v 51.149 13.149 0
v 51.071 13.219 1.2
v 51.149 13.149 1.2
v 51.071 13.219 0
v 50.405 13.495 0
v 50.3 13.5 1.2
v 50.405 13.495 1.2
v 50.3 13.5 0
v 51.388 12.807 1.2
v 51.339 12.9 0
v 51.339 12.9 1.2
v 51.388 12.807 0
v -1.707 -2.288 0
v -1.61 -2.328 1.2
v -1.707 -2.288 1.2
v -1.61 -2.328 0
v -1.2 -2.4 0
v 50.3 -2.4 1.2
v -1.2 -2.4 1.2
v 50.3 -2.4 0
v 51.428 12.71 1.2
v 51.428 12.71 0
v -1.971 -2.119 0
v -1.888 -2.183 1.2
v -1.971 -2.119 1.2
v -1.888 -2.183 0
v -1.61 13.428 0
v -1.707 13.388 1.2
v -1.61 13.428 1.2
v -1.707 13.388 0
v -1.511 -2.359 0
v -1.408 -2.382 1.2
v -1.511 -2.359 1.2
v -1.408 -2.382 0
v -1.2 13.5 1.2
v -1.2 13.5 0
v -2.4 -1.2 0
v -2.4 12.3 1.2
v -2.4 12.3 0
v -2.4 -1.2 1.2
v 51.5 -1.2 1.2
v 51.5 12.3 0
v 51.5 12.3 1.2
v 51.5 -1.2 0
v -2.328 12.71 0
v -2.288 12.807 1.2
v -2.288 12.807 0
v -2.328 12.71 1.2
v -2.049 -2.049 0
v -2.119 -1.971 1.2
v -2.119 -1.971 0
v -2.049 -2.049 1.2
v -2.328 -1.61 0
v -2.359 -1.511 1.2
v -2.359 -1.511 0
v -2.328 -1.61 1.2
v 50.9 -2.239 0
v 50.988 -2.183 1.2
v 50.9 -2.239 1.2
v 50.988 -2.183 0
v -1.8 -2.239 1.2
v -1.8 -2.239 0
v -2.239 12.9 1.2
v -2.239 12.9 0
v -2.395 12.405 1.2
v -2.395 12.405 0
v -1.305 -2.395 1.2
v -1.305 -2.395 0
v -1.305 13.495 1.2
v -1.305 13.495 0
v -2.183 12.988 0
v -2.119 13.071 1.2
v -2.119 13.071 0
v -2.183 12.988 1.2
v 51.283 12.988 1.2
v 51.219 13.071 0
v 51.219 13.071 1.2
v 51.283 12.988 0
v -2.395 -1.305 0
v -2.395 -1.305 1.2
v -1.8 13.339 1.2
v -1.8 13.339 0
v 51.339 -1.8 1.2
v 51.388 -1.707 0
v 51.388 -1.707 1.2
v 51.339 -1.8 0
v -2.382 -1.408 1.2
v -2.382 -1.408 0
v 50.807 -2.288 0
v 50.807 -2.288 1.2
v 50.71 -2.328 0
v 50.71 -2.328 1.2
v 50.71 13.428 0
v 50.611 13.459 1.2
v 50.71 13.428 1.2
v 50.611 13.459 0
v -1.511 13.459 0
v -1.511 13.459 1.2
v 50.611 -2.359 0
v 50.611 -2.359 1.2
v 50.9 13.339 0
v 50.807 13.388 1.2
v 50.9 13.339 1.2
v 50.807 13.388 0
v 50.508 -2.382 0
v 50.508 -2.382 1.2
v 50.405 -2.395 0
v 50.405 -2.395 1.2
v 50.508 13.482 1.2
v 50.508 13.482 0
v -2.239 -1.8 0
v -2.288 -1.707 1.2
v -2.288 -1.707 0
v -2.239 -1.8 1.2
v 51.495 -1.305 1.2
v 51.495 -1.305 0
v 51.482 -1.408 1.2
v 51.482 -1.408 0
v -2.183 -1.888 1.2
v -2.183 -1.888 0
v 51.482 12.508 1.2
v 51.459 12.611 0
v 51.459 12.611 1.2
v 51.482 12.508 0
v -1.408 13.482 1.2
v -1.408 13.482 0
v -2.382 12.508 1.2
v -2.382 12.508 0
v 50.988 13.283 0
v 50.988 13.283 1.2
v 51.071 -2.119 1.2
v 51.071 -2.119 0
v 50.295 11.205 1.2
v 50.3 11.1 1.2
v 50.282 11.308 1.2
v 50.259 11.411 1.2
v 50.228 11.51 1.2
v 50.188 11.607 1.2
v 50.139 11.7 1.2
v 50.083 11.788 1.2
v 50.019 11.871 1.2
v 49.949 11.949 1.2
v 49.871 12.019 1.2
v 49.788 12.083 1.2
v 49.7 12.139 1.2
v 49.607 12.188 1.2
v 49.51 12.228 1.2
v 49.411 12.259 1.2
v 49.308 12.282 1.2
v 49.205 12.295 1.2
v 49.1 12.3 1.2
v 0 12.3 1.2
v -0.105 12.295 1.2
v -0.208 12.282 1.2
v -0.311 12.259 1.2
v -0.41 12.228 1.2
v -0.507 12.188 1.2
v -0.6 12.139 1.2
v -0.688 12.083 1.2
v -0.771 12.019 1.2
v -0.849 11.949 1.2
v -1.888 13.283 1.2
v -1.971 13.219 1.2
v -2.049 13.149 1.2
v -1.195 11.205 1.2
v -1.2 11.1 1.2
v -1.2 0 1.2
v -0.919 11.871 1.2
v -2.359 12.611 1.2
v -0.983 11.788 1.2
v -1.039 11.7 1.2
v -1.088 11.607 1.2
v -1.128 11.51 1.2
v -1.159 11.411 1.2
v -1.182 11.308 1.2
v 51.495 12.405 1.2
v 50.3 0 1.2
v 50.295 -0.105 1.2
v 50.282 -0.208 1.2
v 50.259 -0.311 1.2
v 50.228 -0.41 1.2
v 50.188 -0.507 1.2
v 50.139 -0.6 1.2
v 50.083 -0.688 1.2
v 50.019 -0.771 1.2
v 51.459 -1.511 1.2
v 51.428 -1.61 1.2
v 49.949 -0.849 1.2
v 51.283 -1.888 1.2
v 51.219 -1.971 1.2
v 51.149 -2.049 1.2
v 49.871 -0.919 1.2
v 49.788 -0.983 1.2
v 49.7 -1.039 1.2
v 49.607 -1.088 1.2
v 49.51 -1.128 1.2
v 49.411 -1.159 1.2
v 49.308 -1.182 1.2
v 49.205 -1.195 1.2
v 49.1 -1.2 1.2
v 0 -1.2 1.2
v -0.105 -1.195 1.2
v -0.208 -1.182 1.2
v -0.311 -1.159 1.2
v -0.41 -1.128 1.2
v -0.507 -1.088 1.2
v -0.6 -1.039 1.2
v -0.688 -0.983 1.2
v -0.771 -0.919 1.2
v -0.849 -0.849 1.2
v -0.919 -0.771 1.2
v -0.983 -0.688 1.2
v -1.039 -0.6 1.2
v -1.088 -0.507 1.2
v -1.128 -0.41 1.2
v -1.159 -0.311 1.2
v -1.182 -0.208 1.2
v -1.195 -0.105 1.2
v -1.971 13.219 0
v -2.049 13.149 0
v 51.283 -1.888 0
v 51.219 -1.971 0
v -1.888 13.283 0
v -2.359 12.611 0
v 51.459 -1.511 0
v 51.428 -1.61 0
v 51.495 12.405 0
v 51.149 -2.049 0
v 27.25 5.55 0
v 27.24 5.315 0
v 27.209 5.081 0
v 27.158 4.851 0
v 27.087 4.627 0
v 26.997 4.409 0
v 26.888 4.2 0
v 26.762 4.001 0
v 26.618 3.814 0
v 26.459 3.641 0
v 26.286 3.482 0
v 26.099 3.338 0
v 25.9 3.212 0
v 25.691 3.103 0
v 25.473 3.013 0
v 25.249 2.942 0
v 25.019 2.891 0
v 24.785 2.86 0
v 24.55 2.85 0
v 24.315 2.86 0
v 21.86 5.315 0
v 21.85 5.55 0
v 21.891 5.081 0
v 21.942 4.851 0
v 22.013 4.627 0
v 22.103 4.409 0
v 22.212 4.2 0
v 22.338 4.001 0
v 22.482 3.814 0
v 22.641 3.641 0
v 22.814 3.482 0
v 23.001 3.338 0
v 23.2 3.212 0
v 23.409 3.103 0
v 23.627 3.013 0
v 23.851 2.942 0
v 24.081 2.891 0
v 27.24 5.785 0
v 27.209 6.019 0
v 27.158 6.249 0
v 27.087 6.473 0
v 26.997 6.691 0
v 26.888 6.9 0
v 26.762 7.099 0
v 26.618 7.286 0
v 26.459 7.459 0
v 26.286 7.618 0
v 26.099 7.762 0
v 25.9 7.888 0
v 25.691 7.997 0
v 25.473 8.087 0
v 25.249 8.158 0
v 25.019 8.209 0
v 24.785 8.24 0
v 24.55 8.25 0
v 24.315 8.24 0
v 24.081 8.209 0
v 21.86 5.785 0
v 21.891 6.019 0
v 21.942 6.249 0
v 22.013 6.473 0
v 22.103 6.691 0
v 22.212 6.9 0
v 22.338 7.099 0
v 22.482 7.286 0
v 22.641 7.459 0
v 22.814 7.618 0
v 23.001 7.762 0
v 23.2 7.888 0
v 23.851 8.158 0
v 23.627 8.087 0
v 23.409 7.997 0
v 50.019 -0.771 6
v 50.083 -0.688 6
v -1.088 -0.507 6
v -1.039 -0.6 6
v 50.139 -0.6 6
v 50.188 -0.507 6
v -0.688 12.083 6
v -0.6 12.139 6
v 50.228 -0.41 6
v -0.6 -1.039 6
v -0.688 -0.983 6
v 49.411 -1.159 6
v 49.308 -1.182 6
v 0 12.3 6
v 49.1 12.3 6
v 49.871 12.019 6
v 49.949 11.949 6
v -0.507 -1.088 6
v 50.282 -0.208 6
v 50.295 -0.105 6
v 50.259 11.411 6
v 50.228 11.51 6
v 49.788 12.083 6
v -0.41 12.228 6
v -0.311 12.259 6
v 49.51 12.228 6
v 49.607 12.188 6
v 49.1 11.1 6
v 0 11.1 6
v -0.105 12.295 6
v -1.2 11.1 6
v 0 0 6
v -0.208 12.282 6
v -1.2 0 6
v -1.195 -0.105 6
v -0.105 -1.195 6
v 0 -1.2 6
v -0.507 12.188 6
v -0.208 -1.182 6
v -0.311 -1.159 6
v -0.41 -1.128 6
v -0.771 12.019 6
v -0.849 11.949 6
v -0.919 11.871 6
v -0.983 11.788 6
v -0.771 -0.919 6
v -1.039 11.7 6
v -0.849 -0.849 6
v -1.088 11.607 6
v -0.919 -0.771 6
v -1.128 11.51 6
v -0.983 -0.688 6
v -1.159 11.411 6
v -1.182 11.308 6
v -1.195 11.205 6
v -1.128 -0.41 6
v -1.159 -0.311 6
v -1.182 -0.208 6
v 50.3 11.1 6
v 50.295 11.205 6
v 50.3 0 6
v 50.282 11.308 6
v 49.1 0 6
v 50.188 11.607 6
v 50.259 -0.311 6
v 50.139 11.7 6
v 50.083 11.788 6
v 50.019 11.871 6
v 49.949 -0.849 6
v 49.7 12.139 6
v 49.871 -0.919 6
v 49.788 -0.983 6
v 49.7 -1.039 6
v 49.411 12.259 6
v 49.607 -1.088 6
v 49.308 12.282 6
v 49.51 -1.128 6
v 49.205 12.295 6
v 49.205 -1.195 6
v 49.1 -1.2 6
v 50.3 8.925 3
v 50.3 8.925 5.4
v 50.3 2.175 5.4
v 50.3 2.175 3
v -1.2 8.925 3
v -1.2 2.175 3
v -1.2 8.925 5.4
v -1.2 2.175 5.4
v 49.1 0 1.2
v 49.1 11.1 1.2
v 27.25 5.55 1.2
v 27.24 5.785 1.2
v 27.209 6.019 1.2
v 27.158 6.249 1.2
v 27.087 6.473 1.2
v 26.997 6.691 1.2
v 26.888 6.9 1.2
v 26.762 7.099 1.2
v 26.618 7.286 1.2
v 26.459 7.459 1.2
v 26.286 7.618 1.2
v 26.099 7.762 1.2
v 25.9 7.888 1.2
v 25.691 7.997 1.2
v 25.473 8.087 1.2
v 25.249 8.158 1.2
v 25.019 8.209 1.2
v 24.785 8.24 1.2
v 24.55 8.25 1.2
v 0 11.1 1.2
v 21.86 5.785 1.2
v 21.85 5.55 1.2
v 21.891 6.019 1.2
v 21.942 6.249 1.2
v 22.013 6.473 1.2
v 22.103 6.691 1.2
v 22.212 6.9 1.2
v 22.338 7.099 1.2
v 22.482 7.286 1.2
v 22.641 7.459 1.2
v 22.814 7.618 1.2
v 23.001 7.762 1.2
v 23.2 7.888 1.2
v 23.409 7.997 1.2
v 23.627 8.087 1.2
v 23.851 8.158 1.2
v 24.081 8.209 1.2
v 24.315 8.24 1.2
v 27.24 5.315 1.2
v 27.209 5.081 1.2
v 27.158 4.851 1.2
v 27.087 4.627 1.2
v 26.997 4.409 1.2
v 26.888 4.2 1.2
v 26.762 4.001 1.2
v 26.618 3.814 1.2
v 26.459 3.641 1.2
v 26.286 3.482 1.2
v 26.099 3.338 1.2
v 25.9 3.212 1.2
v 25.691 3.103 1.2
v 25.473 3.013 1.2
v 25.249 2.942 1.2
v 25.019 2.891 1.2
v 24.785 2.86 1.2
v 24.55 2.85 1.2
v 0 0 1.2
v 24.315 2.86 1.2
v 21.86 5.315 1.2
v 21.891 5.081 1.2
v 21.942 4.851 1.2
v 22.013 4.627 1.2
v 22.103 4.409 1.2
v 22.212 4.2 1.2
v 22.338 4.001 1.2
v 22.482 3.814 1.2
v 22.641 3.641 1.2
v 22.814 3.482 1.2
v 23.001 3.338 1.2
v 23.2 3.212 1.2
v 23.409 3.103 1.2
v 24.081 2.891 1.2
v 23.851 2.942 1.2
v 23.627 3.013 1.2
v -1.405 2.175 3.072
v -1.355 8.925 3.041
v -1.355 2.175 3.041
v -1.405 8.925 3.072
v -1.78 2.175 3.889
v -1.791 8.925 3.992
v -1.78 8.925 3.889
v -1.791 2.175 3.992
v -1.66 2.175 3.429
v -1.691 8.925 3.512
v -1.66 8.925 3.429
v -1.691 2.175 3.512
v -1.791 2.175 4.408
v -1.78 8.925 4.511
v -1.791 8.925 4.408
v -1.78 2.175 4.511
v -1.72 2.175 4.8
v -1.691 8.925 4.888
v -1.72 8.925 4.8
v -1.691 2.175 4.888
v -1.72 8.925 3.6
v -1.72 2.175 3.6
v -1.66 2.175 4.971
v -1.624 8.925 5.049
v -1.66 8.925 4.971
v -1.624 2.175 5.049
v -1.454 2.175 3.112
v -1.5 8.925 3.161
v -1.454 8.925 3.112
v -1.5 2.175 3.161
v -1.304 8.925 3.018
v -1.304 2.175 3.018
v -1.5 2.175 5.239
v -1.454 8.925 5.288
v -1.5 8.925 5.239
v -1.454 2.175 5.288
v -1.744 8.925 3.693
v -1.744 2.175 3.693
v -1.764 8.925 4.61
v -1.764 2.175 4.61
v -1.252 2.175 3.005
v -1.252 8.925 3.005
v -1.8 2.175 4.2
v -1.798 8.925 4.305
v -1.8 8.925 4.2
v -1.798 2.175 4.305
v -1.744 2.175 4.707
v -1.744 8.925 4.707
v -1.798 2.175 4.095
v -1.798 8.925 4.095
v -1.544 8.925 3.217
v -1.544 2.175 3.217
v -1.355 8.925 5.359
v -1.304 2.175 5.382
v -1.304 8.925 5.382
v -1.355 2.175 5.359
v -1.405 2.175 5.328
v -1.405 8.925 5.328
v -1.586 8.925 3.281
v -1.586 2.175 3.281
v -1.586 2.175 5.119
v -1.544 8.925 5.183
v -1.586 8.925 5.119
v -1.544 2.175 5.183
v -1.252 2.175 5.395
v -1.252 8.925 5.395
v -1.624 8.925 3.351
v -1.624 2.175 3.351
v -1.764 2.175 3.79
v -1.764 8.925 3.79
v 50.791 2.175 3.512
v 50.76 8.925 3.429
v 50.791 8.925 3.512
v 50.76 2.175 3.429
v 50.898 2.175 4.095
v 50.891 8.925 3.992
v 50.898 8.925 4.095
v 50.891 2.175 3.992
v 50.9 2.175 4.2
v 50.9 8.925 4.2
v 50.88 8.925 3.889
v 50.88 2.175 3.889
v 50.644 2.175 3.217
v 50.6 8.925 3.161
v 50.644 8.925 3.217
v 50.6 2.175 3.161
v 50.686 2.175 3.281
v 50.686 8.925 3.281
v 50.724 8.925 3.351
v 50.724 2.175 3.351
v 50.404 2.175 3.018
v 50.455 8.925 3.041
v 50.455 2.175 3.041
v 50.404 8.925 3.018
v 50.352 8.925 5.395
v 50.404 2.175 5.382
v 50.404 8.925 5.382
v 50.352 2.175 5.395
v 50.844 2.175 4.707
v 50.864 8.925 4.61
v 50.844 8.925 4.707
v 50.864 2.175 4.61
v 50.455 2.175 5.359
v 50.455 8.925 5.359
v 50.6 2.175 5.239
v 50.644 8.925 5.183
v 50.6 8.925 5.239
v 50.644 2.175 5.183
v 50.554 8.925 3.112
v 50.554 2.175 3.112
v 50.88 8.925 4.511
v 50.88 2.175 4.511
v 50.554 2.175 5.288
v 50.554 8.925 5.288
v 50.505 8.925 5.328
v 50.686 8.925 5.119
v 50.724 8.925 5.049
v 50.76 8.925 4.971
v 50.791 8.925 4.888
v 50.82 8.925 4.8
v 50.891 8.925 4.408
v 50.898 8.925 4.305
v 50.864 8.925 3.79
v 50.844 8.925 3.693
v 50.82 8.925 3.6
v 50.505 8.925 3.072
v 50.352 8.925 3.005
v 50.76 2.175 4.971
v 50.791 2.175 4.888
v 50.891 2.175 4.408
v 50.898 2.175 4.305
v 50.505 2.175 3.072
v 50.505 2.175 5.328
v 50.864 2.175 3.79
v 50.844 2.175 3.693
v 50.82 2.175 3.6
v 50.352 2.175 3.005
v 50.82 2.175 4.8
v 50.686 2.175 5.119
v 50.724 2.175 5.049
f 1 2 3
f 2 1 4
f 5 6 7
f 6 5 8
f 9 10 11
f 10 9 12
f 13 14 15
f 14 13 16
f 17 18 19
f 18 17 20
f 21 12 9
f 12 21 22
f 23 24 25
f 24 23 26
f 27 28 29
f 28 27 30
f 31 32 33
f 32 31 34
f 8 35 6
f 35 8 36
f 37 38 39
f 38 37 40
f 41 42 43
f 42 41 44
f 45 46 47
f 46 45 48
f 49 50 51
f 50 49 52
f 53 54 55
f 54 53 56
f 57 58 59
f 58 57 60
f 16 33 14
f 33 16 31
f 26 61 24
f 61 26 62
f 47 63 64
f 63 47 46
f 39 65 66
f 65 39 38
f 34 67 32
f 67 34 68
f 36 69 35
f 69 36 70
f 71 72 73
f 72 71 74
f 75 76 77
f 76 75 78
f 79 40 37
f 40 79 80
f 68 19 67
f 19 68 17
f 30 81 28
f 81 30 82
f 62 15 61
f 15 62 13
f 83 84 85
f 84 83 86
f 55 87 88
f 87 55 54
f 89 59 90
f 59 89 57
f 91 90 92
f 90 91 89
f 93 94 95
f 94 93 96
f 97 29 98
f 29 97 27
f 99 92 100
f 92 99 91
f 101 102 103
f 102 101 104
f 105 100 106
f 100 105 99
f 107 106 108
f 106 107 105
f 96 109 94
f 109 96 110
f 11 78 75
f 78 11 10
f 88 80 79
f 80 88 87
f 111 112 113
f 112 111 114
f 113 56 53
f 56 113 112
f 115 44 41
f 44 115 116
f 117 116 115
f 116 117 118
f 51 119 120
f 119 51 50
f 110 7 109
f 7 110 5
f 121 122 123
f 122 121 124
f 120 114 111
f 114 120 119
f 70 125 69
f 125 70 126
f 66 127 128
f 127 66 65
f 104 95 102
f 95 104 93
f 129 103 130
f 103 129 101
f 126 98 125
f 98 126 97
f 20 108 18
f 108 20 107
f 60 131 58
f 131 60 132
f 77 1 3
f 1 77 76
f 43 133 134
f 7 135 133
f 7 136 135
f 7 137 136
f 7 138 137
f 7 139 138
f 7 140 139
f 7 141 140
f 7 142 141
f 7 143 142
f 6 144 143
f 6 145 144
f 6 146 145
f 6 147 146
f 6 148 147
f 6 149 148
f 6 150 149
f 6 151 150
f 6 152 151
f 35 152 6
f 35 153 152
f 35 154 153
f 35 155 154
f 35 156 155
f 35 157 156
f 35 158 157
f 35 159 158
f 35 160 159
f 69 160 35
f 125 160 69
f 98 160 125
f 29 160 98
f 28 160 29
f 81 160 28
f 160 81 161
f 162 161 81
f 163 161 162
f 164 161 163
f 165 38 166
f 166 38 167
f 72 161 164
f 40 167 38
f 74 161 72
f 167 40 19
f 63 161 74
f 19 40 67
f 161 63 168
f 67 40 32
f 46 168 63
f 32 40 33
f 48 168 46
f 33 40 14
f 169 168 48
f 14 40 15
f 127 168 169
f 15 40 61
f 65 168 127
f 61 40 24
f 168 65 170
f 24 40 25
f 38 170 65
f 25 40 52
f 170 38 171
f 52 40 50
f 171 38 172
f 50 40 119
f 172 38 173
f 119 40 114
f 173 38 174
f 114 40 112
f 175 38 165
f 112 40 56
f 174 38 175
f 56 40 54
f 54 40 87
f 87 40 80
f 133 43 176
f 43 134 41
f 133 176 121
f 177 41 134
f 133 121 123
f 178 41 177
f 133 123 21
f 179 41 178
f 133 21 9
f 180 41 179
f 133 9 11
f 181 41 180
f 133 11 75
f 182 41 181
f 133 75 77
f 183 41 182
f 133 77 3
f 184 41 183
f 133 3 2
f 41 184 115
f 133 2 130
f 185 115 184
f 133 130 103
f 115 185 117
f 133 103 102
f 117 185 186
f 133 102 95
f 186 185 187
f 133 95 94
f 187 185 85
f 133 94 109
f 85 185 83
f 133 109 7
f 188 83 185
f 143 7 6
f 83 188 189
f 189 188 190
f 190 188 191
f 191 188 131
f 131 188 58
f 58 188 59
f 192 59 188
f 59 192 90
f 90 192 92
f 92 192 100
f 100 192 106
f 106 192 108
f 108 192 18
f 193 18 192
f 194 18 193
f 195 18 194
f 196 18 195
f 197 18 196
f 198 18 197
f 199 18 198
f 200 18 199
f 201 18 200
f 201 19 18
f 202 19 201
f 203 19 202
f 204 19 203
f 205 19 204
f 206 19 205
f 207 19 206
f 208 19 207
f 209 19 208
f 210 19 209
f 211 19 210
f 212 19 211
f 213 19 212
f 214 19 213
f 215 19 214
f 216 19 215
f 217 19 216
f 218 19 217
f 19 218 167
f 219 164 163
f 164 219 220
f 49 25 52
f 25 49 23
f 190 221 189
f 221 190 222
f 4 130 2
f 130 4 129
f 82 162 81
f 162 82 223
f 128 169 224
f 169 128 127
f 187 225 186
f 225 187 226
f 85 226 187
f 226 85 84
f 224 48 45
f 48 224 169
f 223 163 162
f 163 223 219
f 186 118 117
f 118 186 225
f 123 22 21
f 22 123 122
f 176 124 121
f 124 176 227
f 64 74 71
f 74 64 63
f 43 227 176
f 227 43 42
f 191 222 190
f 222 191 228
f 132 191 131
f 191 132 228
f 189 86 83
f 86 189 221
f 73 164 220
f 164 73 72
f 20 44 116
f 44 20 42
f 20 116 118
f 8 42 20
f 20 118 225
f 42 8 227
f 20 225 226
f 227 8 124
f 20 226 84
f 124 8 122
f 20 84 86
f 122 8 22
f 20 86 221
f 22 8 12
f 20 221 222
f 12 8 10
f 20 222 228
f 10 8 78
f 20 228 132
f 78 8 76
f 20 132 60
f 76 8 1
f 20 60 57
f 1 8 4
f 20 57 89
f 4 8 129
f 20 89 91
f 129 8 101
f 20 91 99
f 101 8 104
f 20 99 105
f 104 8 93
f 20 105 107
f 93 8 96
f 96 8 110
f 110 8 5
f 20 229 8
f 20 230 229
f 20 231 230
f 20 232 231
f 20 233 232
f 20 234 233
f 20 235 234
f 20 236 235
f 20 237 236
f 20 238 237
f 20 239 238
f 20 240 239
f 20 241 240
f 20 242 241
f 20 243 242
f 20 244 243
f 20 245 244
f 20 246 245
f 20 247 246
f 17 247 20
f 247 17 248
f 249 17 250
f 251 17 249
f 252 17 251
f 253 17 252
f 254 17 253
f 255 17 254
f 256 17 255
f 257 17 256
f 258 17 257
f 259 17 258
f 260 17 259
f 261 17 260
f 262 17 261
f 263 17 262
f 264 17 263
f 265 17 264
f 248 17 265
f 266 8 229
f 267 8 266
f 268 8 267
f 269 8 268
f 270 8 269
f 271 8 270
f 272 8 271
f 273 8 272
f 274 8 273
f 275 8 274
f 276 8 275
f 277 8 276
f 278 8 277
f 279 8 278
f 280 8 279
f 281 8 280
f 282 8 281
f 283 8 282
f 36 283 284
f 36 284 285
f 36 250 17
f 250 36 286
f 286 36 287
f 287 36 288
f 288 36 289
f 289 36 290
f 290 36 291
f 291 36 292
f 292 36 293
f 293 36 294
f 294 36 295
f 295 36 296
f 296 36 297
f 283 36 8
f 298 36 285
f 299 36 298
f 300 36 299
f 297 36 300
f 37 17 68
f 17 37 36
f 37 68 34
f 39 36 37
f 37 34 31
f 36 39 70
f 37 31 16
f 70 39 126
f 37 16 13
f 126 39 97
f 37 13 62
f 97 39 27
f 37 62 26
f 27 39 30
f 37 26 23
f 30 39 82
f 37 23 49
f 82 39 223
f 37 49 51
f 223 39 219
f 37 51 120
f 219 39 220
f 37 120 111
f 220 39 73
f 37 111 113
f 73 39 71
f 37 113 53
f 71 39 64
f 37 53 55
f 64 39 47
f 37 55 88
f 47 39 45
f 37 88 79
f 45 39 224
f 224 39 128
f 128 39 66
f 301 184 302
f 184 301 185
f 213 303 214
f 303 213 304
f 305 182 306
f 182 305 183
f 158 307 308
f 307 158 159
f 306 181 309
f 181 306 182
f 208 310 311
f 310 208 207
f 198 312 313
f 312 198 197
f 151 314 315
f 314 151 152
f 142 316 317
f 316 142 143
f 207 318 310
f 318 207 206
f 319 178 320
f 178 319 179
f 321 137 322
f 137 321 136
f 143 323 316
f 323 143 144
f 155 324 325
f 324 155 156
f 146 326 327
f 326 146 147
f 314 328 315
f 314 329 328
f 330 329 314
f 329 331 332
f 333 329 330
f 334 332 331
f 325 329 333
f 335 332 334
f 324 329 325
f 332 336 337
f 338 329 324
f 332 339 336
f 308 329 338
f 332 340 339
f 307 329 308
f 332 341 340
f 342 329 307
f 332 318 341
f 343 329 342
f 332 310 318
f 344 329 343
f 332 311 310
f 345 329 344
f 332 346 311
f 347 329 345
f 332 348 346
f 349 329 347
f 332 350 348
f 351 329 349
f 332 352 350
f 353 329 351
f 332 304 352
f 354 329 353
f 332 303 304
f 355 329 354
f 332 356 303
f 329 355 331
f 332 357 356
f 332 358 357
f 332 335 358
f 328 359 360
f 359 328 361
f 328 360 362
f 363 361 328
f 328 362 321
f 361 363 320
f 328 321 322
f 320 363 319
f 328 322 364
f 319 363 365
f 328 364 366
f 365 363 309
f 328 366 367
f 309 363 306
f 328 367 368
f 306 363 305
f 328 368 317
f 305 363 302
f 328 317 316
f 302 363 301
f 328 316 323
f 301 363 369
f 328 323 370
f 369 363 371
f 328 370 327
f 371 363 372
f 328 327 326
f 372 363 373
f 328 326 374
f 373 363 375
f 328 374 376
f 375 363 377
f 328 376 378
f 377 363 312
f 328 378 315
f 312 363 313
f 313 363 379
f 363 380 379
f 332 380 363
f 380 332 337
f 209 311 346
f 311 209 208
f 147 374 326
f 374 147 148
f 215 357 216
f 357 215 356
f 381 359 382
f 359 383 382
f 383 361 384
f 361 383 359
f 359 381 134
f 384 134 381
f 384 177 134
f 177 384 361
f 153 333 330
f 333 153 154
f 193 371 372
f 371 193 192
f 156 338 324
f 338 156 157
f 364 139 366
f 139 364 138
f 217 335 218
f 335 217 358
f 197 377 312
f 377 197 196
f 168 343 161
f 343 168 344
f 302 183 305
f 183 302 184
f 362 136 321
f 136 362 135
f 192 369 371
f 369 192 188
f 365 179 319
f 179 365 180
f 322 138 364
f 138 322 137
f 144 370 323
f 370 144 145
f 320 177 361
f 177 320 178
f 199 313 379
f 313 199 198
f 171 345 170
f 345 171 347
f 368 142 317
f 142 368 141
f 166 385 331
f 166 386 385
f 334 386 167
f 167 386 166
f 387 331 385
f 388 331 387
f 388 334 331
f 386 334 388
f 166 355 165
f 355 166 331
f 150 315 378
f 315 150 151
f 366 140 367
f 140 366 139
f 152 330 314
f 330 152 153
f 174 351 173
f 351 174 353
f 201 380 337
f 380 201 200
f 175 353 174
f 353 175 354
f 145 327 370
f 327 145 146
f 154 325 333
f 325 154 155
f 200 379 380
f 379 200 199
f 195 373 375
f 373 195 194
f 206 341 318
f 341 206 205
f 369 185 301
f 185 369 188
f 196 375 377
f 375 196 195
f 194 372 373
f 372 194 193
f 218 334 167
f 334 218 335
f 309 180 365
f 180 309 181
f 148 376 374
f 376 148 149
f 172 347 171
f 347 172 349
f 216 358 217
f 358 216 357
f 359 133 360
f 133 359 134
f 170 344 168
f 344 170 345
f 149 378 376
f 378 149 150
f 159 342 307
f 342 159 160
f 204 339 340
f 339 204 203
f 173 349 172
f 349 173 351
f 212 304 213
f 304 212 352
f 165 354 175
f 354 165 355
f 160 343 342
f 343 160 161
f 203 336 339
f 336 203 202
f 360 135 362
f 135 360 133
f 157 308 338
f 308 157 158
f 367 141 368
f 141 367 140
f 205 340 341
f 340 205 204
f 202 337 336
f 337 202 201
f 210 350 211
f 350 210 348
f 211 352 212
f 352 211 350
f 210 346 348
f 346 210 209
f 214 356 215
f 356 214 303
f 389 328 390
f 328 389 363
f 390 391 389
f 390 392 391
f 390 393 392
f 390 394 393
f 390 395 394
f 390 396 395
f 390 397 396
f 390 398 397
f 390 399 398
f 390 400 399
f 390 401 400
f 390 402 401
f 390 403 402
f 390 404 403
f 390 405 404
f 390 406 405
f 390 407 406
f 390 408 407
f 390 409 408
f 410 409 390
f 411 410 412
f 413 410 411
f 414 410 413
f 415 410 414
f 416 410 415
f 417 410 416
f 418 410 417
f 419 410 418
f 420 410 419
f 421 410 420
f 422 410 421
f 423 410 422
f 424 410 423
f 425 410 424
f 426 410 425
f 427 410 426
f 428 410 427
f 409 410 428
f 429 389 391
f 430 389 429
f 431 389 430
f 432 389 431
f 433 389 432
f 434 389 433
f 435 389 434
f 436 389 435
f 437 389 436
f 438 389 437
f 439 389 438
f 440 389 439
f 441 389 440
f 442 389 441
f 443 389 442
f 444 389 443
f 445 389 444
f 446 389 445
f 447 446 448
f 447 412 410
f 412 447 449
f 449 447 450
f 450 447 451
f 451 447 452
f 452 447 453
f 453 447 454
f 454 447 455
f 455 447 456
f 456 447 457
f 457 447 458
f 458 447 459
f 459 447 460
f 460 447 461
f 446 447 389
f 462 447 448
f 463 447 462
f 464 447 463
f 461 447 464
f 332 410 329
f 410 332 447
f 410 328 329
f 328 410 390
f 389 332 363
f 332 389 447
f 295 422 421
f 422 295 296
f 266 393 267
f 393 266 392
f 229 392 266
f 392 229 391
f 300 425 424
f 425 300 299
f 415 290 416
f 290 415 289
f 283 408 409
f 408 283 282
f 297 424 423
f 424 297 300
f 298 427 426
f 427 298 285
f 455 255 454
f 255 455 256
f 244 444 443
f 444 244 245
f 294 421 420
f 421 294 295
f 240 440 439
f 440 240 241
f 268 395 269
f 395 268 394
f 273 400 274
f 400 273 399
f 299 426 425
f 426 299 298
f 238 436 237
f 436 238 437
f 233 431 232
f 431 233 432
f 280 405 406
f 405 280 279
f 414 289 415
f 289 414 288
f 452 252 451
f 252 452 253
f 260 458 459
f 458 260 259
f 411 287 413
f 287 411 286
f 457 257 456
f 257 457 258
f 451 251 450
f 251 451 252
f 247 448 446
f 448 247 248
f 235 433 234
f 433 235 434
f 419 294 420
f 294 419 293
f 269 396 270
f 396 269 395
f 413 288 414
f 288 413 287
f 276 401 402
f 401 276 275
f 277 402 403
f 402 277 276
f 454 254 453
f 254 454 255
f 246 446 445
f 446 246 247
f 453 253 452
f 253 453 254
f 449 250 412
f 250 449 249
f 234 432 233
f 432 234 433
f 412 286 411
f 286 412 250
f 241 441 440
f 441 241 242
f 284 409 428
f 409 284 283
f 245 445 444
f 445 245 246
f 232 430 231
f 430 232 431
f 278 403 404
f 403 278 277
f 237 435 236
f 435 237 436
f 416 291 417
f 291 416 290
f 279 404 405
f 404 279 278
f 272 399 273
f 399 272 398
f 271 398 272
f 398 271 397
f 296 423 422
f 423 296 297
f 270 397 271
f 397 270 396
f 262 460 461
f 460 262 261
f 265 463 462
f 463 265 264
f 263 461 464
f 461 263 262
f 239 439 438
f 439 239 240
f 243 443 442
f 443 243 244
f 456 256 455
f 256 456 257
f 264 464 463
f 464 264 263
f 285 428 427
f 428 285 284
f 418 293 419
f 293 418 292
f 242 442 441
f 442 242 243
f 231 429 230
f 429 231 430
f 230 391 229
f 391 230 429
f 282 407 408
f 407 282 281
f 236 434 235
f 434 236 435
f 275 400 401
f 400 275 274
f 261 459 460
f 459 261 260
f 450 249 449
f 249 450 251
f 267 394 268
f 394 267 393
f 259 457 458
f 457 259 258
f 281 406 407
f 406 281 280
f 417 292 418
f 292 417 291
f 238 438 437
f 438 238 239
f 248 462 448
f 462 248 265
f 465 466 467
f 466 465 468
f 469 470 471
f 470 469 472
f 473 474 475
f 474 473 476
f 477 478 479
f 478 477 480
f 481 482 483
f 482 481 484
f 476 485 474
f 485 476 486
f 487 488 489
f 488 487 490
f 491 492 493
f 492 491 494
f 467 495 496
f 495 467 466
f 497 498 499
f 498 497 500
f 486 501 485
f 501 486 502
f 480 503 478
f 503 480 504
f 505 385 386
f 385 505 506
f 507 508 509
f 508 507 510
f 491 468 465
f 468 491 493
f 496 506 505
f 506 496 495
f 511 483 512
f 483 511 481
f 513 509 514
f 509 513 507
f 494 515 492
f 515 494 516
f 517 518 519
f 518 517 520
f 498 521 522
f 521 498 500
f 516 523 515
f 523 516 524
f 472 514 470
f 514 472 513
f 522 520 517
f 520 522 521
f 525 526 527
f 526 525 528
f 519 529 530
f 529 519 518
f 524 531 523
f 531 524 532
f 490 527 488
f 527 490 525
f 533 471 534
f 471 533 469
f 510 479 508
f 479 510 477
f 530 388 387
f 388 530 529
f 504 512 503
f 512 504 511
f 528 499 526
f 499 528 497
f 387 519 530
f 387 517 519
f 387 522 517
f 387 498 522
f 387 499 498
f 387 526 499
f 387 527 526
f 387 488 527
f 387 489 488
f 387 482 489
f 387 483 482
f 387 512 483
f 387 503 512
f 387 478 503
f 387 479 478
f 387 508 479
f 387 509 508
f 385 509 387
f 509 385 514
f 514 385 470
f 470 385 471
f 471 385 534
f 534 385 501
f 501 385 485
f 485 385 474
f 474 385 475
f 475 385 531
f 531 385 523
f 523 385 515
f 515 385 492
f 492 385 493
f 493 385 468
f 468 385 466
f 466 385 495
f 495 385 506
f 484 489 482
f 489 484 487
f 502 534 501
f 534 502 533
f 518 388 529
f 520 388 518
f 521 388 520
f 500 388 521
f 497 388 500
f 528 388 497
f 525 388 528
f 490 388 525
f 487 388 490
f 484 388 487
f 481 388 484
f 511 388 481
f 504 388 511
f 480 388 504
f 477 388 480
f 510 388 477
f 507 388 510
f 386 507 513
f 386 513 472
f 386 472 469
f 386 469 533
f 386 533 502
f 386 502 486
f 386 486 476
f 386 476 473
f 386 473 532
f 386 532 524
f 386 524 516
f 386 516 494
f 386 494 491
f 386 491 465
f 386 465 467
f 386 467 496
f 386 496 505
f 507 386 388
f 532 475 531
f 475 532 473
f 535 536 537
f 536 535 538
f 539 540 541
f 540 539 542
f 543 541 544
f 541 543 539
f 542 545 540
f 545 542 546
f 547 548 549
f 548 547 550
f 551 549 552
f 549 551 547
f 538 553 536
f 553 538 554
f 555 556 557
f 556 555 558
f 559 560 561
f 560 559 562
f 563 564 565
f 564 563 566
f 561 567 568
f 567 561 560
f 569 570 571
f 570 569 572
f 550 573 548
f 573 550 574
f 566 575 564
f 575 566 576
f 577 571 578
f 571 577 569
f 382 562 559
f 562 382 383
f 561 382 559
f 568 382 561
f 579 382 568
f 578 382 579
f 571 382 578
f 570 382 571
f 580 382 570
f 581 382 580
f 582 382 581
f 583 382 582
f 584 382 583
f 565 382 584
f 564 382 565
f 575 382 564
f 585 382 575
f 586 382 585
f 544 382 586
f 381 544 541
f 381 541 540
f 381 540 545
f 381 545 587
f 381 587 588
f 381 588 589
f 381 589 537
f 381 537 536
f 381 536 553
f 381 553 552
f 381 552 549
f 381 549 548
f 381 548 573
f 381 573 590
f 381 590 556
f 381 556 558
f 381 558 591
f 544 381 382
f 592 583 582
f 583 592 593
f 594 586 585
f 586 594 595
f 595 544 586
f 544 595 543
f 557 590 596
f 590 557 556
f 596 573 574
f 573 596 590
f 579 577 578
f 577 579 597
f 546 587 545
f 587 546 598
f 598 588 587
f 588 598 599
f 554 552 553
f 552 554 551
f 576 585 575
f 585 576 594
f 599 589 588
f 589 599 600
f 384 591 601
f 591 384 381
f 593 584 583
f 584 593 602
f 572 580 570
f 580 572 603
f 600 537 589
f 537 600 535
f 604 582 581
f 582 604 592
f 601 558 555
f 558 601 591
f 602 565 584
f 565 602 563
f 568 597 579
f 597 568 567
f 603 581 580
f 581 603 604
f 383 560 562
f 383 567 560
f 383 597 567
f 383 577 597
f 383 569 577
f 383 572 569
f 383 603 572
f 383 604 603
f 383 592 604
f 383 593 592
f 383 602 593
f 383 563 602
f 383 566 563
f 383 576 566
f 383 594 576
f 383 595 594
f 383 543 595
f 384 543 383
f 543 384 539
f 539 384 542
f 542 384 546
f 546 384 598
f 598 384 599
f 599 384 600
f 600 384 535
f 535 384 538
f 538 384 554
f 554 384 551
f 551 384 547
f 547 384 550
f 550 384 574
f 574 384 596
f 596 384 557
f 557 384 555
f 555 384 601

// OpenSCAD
t = 1.2;
tolerance = 0.98;

hull_x = 51.5;
hull_y = 13.5;
hull_z = 6.0;

$fn=72;

module border() {
    minkowski() {
        cube([hull_x, hull_y, t-1]);
        cylinder(r=t, h=1);
    }
}

module hole() {
    cylinder(h = t, r = 2.7);
}

module hull() {
    
    difference() {
        union() {
            translate([-t, -t, 0]) border();
            minkowski() {
                cube([hull_x-2*t, hull_y-2*t, hull_z-1]);
                cylinder(r=t, h=1);
            }
        }
    
        translate([0, 0, t]) cube([hull_x-2*t, hull_y-2*t, hull_z-t]);
        
        translate([hull_x/2-t, hull_y/2-t, 0]) hole();
    }
}

translate([0, 0, 0]) hull();

//translate([-1.9*t, hull_y/4-t, t+2]) rotate([0, 23, 0]) cube([1*t, hull_y/2, hull_z/2]);

translate([-t, hull_y/4-t, t+3]) rotate([270, 0, 0]) scale ([0.5, 1, 1]) cylinder(h=hull_y/2, d=2*t);
translate([-t+hull_x, hull_y/4-t, t+3]) rotate([270, 0, 0]) scale ([0.5, 1, 1]) cylinder(h=hull_y/2, d=2*t);
